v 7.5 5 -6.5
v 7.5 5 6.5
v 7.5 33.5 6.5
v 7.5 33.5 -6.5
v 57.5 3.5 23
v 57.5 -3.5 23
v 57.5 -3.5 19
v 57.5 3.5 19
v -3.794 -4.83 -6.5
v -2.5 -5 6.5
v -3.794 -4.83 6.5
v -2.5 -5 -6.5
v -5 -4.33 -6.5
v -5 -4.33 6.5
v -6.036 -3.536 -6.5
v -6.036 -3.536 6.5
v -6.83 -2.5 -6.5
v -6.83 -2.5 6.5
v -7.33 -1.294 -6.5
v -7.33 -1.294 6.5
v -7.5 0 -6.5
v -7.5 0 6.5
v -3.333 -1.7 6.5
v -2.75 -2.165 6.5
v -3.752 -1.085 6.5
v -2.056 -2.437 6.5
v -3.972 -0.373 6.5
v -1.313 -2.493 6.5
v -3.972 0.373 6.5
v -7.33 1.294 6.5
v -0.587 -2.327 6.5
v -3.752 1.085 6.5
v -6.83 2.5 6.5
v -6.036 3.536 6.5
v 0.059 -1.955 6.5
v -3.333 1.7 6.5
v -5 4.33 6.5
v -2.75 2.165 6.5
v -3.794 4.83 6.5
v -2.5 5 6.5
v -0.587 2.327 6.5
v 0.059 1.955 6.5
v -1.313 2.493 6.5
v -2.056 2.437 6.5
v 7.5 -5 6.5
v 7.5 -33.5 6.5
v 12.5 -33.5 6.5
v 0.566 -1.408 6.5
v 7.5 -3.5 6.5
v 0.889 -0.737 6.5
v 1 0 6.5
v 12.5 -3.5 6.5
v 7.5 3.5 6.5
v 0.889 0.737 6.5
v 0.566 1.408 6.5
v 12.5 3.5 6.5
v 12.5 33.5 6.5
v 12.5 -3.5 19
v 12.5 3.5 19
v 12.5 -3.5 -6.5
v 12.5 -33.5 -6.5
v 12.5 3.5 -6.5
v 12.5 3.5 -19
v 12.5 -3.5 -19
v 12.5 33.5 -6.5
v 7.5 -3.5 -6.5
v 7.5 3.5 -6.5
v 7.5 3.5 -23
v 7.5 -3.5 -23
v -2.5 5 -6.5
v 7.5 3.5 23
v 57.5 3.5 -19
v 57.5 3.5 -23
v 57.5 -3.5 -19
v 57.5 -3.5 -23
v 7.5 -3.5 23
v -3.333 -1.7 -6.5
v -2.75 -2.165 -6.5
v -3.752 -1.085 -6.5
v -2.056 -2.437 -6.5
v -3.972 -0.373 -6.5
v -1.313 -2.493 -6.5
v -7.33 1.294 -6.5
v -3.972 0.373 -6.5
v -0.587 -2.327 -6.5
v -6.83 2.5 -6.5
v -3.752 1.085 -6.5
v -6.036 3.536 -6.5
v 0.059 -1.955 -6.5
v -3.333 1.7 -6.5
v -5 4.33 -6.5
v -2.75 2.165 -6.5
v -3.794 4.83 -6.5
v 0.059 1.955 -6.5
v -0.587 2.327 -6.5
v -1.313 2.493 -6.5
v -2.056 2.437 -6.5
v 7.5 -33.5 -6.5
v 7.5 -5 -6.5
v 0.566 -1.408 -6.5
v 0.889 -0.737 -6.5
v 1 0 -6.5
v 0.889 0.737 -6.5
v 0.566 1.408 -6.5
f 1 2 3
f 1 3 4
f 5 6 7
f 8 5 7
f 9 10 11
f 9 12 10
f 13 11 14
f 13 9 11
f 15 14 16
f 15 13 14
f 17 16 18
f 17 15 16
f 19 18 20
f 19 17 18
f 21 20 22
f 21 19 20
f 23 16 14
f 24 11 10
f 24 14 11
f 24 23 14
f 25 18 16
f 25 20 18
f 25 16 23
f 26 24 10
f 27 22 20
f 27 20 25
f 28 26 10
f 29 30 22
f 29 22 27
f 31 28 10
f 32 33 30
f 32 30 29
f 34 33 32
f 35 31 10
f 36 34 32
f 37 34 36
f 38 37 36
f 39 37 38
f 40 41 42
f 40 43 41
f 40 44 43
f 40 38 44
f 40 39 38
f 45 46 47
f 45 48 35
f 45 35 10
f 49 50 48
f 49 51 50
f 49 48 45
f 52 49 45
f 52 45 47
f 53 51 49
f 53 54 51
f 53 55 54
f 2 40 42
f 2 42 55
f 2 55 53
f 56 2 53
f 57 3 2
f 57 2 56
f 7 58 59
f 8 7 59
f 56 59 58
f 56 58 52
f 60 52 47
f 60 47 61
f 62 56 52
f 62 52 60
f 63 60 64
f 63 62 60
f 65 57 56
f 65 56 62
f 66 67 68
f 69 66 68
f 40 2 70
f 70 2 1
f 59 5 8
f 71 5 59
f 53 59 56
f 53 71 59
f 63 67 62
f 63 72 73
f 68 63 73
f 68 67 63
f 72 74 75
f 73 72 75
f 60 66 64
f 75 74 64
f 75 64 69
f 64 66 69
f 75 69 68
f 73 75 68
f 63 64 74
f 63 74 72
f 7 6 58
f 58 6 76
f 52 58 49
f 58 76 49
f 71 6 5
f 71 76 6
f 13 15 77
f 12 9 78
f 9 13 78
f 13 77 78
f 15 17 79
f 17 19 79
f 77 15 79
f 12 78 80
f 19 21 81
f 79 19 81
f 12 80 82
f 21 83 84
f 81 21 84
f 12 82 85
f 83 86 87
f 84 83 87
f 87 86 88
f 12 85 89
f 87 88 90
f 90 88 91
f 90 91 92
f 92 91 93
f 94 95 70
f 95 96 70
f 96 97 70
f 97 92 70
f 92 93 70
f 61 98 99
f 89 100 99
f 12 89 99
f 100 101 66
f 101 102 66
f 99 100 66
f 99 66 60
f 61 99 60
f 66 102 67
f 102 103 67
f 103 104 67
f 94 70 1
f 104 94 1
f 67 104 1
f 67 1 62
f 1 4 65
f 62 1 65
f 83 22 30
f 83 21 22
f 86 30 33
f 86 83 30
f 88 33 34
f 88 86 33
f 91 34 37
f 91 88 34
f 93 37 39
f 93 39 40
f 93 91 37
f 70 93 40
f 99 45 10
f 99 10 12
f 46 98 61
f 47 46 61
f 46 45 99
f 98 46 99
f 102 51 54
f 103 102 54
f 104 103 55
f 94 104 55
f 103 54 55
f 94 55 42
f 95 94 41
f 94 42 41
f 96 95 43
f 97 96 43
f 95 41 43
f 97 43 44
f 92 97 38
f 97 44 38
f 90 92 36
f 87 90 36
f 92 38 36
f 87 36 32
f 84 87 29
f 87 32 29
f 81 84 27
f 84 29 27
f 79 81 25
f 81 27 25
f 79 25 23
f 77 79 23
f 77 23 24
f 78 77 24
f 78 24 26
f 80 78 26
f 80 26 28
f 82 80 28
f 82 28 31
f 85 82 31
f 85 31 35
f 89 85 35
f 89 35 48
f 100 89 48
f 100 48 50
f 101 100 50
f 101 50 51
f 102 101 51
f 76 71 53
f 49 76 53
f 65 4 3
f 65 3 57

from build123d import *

# Parameters (mm, degrees)
SKETCH1_W           = 13
SKETCH1_H           = 10
BOSS_EXTRUDE1_DEPTH = 7.5
SKETCH2_R           = 2.5
CUT_EXTRUDE1_DEPTH  = 15
FILLET1_R           = 5
SKETCH3_W           = 46
SKETCH3_H           = 7
BOSS_EXTRUDE2_DEPTH = 5
SKETCH4_W           = 4
SKETCH4_H           = 7
BOSS_EXTRUDE3_DEPTH = 45
SKETCH5_W           = 5
SKETCH5_H           = 13
BOSS_EXTRUDE4_DEPTH = 30


with BuildPart() as part:
    # Sketch1 → Boss-Extrude1 (new, symmetric)
    with BuildSketch(Plane(origin=(0, 0, 0), x_dir=(0, 0, -1), z_dir=(1, 0, 0))):
        Rectangle(SKETCH1_W, SKETCH1_H)
    extrude(amount=BOSS_EXTRUDE1_DEPTH, both=True)

    # Sketch2 → Cut-Extrude1 (cut)
    with BuildSketch(Plane.XY.offset(6.5)):
        with Locations((-1.5, 0)):
            Circle(SKETCH2_R)
    extrude(amount=-CUT_EXTRUDE1_DEPTH, mode=Mode.SUBTRACT)

    # Fillet1
    fillet1_edges = [part.edges().sort_by_distance(p)[0] for p in [
        (-7.5, -5, 0),
        (-7.5, 5, 0),
    ]]
    fillet(fillet1_edges, radius=FILLET1_R - 0.0001)  # a hair under: the kernel refuses the full size

    # Sketch3 → Boss-Extrude2 (add)
    with BuildSketch(Plane(origin=(7.5, 0, 0), x_dir=(0, 0, -1), z_dir=(1, 0, 0))):
        Rectangle(SKETCH3_W, SKETCH3_H)
    extrude(amount=BOSS_EXTRUDE2_DEPTH)

    # Sketch4 → Boss-Extrude3 (add)
    with BuildSketch(Plane(origin=(12.5, 0, 0), x_dir=(0, 0, -1), z_dir=(1, 0, 0))):
        with Locations((-21, 0)):
            Rectangle(SKETCH4_W, SKETCH4_H)
        with Locations((21, 0)):
            Rectangle(SKETCH4_W, SKETCH4_H)
    extrude(amount=BOSS_EXTRUDE3_DEPTH)

    # Sketch5 → Boss-Extrude4 (add)
    with BuildSketch(Plane(origin=(0, 3.5, 0), x_dir=(1, 0, 0), z_dir=(0, 1, 0))):
        with Locations((10, 0)):
            Rectangle(SKETCH5_W, SKETCH5_H)
    boss_extrude4 = extrude(amount=BOSS_EXTRUDE4_DEPTH)

    # Mirror1: Boss-Extrude4 across plane
    add(boss_extrude4.mirror(Plane.ZX))


solid = part.part
